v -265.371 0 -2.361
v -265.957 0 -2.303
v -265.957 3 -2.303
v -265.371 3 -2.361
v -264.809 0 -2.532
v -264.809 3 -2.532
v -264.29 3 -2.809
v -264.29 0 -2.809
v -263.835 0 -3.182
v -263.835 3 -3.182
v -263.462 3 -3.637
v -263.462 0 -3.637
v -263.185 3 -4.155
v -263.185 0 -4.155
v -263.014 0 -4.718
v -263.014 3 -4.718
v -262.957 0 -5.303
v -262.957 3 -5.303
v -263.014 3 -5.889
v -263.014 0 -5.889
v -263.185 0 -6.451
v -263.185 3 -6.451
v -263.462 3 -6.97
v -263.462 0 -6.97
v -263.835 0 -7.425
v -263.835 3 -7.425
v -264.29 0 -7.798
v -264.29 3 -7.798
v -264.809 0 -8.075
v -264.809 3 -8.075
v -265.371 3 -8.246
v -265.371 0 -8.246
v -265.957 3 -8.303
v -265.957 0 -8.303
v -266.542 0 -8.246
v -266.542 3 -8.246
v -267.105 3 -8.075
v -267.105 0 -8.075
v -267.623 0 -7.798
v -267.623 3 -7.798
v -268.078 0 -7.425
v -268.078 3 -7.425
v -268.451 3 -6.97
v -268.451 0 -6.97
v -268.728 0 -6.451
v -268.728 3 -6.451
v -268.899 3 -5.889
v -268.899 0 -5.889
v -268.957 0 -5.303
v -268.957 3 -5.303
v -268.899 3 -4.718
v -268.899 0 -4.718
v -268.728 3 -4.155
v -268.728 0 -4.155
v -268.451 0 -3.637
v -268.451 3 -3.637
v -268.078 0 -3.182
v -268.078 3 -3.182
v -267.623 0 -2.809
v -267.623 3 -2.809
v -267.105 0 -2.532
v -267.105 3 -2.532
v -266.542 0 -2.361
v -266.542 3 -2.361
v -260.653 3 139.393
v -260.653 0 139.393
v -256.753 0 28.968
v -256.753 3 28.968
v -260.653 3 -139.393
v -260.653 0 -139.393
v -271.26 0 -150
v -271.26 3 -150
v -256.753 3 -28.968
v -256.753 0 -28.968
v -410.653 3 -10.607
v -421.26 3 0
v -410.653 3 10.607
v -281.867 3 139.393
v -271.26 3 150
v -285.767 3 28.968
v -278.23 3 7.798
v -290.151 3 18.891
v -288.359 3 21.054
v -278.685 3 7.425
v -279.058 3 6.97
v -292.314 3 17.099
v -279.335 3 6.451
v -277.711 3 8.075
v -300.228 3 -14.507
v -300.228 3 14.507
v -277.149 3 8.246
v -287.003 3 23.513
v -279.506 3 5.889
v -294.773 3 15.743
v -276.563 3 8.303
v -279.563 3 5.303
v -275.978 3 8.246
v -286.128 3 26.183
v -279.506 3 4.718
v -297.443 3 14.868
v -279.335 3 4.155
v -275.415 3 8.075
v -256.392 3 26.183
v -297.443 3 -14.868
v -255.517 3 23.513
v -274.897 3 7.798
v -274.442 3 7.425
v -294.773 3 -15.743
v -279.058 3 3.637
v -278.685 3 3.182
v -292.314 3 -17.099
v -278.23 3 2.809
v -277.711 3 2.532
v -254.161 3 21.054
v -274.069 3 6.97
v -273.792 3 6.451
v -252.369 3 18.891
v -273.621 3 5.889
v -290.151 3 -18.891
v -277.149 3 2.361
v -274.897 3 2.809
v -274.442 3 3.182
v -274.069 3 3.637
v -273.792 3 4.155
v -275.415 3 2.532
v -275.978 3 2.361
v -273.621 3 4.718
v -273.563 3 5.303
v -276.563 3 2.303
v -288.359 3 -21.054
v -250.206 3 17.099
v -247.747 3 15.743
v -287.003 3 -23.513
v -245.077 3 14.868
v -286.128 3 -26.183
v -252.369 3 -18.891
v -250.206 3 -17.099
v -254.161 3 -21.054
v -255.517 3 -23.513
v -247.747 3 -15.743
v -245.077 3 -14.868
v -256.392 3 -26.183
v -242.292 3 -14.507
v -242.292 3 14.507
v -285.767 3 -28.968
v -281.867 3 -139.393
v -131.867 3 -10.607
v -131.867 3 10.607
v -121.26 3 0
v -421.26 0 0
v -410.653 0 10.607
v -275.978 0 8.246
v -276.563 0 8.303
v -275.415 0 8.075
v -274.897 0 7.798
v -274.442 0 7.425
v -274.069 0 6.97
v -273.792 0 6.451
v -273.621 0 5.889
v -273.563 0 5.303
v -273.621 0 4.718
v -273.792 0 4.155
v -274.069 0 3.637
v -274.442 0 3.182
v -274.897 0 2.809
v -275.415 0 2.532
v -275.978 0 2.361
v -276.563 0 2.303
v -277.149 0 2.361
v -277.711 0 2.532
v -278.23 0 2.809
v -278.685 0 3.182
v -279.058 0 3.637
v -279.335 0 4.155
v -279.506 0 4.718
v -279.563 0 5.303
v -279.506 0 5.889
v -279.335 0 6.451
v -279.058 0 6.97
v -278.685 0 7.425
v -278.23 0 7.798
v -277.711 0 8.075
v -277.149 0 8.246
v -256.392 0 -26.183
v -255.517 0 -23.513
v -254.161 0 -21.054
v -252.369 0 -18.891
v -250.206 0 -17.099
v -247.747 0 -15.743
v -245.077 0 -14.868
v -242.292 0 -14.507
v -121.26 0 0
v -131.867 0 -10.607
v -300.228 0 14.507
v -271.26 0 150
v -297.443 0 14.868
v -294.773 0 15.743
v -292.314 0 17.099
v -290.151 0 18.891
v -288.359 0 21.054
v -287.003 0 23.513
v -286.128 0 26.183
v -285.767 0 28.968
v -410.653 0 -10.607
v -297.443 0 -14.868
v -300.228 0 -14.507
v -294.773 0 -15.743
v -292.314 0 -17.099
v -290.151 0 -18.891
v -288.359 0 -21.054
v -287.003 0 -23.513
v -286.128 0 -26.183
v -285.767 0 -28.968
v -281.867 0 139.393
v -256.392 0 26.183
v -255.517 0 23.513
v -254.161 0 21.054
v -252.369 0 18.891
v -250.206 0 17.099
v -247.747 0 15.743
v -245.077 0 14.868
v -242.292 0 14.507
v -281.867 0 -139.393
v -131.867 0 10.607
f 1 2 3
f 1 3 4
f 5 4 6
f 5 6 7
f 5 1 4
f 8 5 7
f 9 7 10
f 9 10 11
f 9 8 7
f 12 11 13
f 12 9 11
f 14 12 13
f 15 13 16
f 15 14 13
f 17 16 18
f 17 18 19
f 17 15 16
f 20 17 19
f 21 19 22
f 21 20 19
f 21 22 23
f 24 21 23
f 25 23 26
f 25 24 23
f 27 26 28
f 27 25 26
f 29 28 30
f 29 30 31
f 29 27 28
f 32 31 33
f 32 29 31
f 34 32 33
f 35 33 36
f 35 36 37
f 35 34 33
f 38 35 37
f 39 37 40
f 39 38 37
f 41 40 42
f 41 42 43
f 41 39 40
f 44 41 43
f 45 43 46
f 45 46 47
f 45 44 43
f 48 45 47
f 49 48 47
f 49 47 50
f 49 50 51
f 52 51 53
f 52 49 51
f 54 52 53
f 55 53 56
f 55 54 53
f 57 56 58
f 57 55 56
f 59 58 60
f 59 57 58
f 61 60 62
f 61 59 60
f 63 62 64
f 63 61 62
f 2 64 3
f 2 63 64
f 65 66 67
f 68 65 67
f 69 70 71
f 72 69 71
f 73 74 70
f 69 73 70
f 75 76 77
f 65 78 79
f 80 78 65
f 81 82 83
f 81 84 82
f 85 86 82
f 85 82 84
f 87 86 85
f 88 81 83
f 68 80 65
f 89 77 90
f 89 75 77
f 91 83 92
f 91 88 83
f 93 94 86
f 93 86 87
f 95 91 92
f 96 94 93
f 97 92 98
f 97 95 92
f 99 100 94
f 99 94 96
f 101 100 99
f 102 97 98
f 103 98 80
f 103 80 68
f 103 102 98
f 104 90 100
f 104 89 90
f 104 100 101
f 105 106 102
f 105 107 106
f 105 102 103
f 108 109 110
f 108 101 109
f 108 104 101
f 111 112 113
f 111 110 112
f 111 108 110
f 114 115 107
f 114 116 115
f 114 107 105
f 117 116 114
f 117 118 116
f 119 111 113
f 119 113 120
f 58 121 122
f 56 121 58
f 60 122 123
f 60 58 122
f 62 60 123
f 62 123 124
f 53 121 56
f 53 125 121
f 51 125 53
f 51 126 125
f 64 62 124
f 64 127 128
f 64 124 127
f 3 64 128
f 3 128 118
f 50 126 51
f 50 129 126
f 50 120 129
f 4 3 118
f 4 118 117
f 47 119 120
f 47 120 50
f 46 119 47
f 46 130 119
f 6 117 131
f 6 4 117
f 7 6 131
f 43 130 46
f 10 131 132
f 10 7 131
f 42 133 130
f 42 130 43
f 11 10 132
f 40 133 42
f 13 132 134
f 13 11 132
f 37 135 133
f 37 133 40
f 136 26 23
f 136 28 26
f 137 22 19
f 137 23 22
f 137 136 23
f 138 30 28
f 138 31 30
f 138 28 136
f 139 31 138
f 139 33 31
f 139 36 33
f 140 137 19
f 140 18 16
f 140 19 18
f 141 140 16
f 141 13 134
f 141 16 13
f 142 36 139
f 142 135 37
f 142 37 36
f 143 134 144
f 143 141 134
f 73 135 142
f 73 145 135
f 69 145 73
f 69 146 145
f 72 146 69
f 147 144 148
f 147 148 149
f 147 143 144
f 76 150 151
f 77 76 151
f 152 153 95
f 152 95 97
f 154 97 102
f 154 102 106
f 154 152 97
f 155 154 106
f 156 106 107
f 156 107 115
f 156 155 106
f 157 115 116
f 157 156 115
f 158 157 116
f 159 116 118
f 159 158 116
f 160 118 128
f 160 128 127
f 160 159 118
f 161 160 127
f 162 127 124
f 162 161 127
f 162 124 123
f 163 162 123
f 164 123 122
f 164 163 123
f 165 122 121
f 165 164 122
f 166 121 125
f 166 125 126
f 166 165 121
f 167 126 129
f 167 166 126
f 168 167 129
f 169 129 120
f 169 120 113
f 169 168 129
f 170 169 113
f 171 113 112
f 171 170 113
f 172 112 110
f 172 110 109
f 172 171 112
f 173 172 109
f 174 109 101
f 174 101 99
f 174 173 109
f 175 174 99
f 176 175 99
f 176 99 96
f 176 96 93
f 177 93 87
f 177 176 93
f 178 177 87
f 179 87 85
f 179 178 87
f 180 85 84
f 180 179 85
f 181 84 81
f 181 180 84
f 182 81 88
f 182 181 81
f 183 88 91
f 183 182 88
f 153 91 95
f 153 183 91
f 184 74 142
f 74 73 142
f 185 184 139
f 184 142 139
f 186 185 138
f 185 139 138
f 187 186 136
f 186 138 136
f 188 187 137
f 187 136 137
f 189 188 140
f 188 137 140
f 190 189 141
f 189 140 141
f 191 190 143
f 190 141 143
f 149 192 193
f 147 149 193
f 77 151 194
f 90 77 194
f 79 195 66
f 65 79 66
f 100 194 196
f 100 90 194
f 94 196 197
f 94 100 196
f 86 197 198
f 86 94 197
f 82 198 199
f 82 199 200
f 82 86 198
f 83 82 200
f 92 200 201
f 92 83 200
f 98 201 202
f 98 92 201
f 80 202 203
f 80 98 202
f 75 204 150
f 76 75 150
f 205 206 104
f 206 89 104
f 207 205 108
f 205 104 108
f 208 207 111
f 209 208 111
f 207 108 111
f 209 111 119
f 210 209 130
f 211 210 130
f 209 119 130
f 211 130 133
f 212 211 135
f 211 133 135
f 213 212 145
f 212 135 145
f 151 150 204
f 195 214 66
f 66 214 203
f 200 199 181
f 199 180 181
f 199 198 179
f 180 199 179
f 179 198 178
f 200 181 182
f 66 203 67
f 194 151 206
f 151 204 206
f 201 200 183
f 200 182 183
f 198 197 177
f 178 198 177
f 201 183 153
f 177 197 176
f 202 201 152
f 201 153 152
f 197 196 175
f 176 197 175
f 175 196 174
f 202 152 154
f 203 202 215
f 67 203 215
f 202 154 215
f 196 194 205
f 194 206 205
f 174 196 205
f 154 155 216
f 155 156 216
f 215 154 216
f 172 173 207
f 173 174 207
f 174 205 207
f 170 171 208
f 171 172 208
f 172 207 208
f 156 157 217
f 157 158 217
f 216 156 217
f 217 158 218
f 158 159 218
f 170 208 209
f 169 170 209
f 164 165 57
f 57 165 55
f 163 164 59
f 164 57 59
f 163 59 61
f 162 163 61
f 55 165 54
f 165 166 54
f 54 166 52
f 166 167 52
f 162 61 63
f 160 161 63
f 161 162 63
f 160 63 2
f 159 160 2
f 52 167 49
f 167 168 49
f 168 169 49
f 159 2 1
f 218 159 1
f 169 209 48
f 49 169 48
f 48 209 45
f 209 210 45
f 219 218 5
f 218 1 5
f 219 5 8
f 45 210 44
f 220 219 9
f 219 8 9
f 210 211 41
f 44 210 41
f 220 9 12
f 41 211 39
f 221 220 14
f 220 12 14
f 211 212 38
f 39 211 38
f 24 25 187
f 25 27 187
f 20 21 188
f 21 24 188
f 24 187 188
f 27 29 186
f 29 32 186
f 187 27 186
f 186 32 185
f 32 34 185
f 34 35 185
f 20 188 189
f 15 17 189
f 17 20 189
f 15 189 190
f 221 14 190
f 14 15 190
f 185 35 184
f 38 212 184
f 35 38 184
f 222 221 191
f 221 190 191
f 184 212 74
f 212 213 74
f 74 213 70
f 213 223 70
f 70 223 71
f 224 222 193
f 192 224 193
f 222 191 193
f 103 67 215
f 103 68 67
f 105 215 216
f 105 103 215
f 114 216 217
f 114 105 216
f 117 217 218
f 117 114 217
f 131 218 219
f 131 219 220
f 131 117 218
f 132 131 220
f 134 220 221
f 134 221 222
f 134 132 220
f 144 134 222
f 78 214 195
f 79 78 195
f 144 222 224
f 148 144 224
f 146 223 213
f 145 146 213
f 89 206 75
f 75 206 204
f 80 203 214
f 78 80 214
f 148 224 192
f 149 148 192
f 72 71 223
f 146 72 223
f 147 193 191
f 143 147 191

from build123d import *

# Parameters (mm, degrees)
SKETCH1_R           = 3
BOSS_EXTRUDE1_DEPTH = 3
FILLET1_R           = 15


with BuildPart() as part:
    # Sketch1 → Boss-Extrude1 (new body)
    with BuildSketch(Plane(origin=(0, 0, 0), x_dir=(1, 0, 0), z_dir=(0, 1, 0))):
        Polygon((-286.26, 15), (-410.653398282, 10.606601718), (-421.26, 0), (-410.653398282, -10.606601718), (-286.26, -15), (-281.866601718, -139.393398282), (-271.26, -150), (-260.653398282, -139.393398282), (-256.26, -15), (-131.866601718, -10.606601718), (-121.26, 0), (-131.866601718, 10.606601718), (-256.26, 15), (-260.653398282, 139.393398282), (-271.26, 150), (-281.866601718, 139.393398282), align=None)
        with Locations(Location((-276.563300859, -5.303300859, 0), (0, 0, 270))):
            Circle(SKETCH1_R, mode=Mode.SUBTRACT)
        with Locations(Location((-265.956699141, 5.303300859, 0), (0, 0, 270))):
            Circle(SKETCH1_R, mode=Mode.SUBTRACT)
    extrude(amount=BOSS_EXTRUDE1_DEPTH)

    # Fillet1
    fillet1_edges = [part.edges().sort_by_distance(p)[0] for p in [
        (-256.26, 1.5, -15),
        (-256.26, 1.5, 15),
        (-286.26, 1.5, 15),
        (-286.26, 1.5, -15),
    ]]
    fillet(fillet1_edges, radius=FILLET1_R)


solid = part.part
